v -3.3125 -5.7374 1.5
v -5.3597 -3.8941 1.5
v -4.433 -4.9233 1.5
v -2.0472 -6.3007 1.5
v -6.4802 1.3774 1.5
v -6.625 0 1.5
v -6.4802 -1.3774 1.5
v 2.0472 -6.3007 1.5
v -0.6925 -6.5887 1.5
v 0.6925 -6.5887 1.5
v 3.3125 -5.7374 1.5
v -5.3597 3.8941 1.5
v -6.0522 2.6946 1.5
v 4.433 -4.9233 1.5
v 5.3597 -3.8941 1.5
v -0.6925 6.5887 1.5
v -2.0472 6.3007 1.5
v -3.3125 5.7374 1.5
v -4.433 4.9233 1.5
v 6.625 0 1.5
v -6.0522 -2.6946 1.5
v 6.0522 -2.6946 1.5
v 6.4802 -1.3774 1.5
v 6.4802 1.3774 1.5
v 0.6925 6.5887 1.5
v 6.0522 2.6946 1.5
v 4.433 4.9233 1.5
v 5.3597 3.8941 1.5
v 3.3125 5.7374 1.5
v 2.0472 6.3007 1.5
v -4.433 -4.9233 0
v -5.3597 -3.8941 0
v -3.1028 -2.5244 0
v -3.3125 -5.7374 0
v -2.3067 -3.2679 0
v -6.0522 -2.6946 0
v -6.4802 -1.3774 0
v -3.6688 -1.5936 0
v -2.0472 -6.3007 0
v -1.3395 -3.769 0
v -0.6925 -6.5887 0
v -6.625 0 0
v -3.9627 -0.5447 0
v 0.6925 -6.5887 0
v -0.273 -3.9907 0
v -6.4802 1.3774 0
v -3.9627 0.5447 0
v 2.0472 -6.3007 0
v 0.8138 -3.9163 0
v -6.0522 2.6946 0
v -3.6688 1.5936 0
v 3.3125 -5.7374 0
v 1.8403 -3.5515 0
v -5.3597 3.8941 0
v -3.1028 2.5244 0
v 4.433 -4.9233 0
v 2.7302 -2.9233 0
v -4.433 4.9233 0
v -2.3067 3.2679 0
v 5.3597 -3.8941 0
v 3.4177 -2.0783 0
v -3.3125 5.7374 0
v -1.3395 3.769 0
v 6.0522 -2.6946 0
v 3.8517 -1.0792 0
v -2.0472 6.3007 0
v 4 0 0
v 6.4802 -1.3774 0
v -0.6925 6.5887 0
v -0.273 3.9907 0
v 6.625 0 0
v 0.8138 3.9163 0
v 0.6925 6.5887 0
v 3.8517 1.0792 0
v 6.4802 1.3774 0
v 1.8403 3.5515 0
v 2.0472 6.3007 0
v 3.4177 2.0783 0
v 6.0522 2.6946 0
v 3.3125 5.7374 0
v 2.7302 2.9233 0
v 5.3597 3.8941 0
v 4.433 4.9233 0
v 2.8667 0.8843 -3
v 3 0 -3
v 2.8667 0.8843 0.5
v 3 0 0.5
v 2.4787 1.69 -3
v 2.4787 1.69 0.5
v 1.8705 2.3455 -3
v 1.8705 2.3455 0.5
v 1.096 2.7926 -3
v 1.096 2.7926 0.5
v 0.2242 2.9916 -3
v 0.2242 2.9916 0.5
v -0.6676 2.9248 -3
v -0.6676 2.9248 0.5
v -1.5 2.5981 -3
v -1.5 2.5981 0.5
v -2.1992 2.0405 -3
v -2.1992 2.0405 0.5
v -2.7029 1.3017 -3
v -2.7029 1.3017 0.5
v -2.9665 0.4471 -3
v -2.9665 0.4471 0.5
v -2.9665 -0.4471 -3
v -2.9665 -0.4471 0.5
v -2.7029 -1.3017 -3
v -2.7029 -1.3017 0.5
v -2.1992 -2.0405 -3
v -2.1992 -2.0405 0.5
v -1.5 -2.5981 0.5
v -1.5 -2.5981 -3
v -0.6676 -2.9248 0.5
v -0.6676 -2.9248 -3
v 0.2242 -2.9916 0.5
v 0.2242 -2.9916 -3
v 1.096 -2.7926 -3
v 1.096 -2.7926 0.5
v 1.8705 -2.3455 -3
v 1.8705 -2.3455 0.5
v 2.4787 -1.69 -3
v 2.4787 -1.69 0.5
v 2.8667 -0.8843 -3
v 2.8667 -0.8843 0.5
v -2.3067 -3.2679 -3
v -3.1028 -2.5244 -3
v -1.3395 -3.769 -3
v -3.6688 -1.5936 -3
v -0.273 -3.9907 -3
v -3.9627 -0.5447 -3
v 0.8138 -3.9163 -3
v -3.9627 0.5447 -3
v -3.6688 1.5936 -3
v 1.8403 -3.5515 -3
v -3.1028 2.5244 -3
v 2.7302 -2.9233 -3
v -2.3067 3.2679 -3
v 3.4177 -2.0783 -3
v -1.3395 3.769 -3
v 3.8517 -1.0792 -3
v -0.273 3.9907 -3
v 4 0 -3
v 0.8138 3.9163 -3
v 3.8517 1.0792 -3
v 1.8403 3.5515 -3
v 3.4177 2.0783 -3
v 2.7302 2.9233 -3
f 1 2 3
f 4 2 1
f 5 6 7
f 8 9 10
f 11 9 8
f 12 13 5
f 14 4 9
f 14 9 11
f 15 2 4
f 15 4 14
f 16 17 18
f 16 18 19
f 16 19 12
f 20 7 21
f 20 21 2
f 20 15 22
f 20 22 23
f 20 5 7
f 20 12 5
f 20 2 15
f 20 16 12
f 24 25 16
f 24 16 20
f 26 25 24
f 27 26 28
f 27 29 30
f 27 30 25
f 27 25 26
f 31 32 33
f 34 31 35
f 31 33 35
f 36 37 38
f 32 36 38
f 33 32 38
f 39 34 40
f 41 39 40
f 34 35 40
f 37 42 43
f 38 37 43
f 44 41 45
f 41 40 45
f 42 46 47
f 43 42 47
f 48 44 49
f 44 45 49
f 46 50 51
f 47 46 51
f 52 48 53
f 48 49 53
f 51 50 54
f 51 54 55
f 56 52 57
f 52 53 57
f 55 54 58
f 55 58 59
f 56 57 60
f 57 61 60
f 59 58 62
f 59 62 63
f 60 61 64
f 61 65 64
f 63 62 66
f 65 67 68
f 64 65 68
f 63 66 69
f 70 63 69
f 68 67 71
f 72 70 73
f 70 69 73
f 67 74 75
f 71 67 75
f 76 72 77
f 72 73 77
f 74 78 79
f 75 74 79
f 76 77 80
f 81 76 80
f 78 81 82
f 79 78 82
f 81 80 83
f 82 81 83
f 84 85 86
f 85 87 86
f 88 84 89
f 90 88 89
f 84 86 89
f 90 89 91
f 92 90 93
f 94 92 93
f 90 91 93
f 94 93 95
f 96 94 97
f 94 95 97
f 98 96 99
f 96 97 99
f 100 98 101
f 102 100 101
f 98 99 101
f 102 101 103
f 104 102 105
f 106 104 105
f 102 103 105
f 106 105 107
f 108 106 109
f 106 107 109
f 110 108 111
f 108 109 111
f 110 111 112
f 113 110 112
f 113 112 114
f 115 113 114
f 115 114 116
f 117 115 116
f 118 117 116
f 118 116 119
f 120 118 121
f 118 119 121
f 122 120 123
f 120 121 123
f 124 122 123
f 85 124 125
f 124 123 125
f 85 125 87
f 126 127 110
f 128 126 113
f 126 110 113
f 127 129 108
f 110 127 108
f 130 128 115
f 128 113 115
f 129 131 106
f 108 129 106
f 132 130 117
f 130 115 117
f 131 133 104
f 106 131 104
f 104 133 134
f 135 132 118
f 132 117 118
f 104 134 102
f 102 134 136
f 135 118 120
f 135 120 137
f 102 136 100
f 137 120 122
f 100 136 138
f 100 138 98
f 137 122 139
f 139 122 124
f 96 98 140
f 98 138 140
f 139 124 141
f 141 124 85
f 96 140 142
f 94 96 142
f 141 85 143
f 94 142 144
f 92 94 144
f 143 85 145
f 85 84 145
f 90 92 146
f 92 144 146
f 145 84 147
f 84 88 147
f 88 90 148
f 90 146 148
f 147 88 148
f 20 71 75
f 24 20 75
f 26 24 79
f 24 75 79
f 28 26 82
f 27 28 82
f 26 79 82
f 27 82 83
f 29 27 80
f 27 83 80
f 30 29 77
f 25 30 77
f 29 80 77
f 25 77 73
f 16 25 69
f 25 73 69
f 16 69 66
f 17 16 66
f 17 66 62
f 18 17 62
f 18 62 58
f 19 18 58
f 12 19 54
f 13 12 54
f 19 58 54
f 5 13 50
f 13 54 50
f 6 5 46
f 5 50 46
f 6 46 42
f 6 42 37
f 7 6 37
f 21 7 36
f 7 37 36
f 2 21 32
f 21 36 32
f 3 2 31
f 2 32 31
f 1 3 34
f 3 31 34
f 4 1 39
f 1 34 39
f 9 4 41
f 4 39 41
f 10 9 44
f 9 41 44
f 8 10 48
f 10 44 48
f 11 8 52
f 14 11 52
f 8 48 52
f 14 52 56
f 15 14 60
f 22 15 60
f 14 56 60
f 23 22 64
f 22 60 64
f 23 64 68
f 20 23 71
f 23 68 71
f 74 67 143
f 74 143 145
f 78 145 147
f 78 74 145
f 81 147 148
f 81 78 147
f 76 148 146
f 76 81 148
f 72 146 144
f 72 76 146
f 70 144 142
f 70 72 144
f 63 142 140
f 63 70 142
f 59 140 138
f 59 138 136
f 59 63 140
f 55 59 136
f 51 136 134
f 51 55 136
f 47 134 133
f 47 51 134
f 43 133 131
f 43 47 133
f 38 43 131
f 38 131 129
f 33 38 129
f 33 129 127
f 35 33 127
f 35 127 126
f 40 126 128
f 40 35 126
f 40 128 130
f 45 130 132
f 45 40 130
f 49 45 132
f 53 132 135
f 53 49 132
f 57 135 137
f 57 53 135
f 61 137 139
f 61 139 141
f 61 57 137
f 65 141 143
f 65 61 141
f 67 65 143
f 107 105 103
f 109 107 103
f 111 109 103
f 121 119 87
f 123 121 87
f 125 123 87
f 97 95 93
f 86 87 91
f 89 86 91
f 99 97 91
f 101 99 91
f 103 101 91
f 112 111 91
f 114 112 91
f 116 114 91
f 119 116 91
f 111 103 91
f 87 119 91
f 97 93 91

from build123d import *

# Parameters (mm, degrees)
F0_R     = 6.625
F0_R_2   = 4
F1_DEPTH = 1.5
F2_DEPTH = 3
F3_T     = -1


with BuildPart() as f1:
    # F0 (on Top) → F1 (new body)
    with BuildSketch(Plane.XY):
        Circle(F0_R)
        Circle(F0_R_2, mode=Mode.SUBTRACT)
        Circle(F0_R_2)
    extrude(amount=F1_DEPTH)

    # F0 (on Top) → F2 (join)
    with BuildSketch(Plane.XY):
        Circle(F0_R_2)
    extrude(amount=-F2_DEPTH)

    # F3
    f3_openings = [f1.faces().sort_by_distance(p)[0] for p in [
        (0, 0, -3),
    ]]
    offset(amount=F3_T, openings=f3_openings, kind=Kind.INTERSECTION)


solid = f1.part
